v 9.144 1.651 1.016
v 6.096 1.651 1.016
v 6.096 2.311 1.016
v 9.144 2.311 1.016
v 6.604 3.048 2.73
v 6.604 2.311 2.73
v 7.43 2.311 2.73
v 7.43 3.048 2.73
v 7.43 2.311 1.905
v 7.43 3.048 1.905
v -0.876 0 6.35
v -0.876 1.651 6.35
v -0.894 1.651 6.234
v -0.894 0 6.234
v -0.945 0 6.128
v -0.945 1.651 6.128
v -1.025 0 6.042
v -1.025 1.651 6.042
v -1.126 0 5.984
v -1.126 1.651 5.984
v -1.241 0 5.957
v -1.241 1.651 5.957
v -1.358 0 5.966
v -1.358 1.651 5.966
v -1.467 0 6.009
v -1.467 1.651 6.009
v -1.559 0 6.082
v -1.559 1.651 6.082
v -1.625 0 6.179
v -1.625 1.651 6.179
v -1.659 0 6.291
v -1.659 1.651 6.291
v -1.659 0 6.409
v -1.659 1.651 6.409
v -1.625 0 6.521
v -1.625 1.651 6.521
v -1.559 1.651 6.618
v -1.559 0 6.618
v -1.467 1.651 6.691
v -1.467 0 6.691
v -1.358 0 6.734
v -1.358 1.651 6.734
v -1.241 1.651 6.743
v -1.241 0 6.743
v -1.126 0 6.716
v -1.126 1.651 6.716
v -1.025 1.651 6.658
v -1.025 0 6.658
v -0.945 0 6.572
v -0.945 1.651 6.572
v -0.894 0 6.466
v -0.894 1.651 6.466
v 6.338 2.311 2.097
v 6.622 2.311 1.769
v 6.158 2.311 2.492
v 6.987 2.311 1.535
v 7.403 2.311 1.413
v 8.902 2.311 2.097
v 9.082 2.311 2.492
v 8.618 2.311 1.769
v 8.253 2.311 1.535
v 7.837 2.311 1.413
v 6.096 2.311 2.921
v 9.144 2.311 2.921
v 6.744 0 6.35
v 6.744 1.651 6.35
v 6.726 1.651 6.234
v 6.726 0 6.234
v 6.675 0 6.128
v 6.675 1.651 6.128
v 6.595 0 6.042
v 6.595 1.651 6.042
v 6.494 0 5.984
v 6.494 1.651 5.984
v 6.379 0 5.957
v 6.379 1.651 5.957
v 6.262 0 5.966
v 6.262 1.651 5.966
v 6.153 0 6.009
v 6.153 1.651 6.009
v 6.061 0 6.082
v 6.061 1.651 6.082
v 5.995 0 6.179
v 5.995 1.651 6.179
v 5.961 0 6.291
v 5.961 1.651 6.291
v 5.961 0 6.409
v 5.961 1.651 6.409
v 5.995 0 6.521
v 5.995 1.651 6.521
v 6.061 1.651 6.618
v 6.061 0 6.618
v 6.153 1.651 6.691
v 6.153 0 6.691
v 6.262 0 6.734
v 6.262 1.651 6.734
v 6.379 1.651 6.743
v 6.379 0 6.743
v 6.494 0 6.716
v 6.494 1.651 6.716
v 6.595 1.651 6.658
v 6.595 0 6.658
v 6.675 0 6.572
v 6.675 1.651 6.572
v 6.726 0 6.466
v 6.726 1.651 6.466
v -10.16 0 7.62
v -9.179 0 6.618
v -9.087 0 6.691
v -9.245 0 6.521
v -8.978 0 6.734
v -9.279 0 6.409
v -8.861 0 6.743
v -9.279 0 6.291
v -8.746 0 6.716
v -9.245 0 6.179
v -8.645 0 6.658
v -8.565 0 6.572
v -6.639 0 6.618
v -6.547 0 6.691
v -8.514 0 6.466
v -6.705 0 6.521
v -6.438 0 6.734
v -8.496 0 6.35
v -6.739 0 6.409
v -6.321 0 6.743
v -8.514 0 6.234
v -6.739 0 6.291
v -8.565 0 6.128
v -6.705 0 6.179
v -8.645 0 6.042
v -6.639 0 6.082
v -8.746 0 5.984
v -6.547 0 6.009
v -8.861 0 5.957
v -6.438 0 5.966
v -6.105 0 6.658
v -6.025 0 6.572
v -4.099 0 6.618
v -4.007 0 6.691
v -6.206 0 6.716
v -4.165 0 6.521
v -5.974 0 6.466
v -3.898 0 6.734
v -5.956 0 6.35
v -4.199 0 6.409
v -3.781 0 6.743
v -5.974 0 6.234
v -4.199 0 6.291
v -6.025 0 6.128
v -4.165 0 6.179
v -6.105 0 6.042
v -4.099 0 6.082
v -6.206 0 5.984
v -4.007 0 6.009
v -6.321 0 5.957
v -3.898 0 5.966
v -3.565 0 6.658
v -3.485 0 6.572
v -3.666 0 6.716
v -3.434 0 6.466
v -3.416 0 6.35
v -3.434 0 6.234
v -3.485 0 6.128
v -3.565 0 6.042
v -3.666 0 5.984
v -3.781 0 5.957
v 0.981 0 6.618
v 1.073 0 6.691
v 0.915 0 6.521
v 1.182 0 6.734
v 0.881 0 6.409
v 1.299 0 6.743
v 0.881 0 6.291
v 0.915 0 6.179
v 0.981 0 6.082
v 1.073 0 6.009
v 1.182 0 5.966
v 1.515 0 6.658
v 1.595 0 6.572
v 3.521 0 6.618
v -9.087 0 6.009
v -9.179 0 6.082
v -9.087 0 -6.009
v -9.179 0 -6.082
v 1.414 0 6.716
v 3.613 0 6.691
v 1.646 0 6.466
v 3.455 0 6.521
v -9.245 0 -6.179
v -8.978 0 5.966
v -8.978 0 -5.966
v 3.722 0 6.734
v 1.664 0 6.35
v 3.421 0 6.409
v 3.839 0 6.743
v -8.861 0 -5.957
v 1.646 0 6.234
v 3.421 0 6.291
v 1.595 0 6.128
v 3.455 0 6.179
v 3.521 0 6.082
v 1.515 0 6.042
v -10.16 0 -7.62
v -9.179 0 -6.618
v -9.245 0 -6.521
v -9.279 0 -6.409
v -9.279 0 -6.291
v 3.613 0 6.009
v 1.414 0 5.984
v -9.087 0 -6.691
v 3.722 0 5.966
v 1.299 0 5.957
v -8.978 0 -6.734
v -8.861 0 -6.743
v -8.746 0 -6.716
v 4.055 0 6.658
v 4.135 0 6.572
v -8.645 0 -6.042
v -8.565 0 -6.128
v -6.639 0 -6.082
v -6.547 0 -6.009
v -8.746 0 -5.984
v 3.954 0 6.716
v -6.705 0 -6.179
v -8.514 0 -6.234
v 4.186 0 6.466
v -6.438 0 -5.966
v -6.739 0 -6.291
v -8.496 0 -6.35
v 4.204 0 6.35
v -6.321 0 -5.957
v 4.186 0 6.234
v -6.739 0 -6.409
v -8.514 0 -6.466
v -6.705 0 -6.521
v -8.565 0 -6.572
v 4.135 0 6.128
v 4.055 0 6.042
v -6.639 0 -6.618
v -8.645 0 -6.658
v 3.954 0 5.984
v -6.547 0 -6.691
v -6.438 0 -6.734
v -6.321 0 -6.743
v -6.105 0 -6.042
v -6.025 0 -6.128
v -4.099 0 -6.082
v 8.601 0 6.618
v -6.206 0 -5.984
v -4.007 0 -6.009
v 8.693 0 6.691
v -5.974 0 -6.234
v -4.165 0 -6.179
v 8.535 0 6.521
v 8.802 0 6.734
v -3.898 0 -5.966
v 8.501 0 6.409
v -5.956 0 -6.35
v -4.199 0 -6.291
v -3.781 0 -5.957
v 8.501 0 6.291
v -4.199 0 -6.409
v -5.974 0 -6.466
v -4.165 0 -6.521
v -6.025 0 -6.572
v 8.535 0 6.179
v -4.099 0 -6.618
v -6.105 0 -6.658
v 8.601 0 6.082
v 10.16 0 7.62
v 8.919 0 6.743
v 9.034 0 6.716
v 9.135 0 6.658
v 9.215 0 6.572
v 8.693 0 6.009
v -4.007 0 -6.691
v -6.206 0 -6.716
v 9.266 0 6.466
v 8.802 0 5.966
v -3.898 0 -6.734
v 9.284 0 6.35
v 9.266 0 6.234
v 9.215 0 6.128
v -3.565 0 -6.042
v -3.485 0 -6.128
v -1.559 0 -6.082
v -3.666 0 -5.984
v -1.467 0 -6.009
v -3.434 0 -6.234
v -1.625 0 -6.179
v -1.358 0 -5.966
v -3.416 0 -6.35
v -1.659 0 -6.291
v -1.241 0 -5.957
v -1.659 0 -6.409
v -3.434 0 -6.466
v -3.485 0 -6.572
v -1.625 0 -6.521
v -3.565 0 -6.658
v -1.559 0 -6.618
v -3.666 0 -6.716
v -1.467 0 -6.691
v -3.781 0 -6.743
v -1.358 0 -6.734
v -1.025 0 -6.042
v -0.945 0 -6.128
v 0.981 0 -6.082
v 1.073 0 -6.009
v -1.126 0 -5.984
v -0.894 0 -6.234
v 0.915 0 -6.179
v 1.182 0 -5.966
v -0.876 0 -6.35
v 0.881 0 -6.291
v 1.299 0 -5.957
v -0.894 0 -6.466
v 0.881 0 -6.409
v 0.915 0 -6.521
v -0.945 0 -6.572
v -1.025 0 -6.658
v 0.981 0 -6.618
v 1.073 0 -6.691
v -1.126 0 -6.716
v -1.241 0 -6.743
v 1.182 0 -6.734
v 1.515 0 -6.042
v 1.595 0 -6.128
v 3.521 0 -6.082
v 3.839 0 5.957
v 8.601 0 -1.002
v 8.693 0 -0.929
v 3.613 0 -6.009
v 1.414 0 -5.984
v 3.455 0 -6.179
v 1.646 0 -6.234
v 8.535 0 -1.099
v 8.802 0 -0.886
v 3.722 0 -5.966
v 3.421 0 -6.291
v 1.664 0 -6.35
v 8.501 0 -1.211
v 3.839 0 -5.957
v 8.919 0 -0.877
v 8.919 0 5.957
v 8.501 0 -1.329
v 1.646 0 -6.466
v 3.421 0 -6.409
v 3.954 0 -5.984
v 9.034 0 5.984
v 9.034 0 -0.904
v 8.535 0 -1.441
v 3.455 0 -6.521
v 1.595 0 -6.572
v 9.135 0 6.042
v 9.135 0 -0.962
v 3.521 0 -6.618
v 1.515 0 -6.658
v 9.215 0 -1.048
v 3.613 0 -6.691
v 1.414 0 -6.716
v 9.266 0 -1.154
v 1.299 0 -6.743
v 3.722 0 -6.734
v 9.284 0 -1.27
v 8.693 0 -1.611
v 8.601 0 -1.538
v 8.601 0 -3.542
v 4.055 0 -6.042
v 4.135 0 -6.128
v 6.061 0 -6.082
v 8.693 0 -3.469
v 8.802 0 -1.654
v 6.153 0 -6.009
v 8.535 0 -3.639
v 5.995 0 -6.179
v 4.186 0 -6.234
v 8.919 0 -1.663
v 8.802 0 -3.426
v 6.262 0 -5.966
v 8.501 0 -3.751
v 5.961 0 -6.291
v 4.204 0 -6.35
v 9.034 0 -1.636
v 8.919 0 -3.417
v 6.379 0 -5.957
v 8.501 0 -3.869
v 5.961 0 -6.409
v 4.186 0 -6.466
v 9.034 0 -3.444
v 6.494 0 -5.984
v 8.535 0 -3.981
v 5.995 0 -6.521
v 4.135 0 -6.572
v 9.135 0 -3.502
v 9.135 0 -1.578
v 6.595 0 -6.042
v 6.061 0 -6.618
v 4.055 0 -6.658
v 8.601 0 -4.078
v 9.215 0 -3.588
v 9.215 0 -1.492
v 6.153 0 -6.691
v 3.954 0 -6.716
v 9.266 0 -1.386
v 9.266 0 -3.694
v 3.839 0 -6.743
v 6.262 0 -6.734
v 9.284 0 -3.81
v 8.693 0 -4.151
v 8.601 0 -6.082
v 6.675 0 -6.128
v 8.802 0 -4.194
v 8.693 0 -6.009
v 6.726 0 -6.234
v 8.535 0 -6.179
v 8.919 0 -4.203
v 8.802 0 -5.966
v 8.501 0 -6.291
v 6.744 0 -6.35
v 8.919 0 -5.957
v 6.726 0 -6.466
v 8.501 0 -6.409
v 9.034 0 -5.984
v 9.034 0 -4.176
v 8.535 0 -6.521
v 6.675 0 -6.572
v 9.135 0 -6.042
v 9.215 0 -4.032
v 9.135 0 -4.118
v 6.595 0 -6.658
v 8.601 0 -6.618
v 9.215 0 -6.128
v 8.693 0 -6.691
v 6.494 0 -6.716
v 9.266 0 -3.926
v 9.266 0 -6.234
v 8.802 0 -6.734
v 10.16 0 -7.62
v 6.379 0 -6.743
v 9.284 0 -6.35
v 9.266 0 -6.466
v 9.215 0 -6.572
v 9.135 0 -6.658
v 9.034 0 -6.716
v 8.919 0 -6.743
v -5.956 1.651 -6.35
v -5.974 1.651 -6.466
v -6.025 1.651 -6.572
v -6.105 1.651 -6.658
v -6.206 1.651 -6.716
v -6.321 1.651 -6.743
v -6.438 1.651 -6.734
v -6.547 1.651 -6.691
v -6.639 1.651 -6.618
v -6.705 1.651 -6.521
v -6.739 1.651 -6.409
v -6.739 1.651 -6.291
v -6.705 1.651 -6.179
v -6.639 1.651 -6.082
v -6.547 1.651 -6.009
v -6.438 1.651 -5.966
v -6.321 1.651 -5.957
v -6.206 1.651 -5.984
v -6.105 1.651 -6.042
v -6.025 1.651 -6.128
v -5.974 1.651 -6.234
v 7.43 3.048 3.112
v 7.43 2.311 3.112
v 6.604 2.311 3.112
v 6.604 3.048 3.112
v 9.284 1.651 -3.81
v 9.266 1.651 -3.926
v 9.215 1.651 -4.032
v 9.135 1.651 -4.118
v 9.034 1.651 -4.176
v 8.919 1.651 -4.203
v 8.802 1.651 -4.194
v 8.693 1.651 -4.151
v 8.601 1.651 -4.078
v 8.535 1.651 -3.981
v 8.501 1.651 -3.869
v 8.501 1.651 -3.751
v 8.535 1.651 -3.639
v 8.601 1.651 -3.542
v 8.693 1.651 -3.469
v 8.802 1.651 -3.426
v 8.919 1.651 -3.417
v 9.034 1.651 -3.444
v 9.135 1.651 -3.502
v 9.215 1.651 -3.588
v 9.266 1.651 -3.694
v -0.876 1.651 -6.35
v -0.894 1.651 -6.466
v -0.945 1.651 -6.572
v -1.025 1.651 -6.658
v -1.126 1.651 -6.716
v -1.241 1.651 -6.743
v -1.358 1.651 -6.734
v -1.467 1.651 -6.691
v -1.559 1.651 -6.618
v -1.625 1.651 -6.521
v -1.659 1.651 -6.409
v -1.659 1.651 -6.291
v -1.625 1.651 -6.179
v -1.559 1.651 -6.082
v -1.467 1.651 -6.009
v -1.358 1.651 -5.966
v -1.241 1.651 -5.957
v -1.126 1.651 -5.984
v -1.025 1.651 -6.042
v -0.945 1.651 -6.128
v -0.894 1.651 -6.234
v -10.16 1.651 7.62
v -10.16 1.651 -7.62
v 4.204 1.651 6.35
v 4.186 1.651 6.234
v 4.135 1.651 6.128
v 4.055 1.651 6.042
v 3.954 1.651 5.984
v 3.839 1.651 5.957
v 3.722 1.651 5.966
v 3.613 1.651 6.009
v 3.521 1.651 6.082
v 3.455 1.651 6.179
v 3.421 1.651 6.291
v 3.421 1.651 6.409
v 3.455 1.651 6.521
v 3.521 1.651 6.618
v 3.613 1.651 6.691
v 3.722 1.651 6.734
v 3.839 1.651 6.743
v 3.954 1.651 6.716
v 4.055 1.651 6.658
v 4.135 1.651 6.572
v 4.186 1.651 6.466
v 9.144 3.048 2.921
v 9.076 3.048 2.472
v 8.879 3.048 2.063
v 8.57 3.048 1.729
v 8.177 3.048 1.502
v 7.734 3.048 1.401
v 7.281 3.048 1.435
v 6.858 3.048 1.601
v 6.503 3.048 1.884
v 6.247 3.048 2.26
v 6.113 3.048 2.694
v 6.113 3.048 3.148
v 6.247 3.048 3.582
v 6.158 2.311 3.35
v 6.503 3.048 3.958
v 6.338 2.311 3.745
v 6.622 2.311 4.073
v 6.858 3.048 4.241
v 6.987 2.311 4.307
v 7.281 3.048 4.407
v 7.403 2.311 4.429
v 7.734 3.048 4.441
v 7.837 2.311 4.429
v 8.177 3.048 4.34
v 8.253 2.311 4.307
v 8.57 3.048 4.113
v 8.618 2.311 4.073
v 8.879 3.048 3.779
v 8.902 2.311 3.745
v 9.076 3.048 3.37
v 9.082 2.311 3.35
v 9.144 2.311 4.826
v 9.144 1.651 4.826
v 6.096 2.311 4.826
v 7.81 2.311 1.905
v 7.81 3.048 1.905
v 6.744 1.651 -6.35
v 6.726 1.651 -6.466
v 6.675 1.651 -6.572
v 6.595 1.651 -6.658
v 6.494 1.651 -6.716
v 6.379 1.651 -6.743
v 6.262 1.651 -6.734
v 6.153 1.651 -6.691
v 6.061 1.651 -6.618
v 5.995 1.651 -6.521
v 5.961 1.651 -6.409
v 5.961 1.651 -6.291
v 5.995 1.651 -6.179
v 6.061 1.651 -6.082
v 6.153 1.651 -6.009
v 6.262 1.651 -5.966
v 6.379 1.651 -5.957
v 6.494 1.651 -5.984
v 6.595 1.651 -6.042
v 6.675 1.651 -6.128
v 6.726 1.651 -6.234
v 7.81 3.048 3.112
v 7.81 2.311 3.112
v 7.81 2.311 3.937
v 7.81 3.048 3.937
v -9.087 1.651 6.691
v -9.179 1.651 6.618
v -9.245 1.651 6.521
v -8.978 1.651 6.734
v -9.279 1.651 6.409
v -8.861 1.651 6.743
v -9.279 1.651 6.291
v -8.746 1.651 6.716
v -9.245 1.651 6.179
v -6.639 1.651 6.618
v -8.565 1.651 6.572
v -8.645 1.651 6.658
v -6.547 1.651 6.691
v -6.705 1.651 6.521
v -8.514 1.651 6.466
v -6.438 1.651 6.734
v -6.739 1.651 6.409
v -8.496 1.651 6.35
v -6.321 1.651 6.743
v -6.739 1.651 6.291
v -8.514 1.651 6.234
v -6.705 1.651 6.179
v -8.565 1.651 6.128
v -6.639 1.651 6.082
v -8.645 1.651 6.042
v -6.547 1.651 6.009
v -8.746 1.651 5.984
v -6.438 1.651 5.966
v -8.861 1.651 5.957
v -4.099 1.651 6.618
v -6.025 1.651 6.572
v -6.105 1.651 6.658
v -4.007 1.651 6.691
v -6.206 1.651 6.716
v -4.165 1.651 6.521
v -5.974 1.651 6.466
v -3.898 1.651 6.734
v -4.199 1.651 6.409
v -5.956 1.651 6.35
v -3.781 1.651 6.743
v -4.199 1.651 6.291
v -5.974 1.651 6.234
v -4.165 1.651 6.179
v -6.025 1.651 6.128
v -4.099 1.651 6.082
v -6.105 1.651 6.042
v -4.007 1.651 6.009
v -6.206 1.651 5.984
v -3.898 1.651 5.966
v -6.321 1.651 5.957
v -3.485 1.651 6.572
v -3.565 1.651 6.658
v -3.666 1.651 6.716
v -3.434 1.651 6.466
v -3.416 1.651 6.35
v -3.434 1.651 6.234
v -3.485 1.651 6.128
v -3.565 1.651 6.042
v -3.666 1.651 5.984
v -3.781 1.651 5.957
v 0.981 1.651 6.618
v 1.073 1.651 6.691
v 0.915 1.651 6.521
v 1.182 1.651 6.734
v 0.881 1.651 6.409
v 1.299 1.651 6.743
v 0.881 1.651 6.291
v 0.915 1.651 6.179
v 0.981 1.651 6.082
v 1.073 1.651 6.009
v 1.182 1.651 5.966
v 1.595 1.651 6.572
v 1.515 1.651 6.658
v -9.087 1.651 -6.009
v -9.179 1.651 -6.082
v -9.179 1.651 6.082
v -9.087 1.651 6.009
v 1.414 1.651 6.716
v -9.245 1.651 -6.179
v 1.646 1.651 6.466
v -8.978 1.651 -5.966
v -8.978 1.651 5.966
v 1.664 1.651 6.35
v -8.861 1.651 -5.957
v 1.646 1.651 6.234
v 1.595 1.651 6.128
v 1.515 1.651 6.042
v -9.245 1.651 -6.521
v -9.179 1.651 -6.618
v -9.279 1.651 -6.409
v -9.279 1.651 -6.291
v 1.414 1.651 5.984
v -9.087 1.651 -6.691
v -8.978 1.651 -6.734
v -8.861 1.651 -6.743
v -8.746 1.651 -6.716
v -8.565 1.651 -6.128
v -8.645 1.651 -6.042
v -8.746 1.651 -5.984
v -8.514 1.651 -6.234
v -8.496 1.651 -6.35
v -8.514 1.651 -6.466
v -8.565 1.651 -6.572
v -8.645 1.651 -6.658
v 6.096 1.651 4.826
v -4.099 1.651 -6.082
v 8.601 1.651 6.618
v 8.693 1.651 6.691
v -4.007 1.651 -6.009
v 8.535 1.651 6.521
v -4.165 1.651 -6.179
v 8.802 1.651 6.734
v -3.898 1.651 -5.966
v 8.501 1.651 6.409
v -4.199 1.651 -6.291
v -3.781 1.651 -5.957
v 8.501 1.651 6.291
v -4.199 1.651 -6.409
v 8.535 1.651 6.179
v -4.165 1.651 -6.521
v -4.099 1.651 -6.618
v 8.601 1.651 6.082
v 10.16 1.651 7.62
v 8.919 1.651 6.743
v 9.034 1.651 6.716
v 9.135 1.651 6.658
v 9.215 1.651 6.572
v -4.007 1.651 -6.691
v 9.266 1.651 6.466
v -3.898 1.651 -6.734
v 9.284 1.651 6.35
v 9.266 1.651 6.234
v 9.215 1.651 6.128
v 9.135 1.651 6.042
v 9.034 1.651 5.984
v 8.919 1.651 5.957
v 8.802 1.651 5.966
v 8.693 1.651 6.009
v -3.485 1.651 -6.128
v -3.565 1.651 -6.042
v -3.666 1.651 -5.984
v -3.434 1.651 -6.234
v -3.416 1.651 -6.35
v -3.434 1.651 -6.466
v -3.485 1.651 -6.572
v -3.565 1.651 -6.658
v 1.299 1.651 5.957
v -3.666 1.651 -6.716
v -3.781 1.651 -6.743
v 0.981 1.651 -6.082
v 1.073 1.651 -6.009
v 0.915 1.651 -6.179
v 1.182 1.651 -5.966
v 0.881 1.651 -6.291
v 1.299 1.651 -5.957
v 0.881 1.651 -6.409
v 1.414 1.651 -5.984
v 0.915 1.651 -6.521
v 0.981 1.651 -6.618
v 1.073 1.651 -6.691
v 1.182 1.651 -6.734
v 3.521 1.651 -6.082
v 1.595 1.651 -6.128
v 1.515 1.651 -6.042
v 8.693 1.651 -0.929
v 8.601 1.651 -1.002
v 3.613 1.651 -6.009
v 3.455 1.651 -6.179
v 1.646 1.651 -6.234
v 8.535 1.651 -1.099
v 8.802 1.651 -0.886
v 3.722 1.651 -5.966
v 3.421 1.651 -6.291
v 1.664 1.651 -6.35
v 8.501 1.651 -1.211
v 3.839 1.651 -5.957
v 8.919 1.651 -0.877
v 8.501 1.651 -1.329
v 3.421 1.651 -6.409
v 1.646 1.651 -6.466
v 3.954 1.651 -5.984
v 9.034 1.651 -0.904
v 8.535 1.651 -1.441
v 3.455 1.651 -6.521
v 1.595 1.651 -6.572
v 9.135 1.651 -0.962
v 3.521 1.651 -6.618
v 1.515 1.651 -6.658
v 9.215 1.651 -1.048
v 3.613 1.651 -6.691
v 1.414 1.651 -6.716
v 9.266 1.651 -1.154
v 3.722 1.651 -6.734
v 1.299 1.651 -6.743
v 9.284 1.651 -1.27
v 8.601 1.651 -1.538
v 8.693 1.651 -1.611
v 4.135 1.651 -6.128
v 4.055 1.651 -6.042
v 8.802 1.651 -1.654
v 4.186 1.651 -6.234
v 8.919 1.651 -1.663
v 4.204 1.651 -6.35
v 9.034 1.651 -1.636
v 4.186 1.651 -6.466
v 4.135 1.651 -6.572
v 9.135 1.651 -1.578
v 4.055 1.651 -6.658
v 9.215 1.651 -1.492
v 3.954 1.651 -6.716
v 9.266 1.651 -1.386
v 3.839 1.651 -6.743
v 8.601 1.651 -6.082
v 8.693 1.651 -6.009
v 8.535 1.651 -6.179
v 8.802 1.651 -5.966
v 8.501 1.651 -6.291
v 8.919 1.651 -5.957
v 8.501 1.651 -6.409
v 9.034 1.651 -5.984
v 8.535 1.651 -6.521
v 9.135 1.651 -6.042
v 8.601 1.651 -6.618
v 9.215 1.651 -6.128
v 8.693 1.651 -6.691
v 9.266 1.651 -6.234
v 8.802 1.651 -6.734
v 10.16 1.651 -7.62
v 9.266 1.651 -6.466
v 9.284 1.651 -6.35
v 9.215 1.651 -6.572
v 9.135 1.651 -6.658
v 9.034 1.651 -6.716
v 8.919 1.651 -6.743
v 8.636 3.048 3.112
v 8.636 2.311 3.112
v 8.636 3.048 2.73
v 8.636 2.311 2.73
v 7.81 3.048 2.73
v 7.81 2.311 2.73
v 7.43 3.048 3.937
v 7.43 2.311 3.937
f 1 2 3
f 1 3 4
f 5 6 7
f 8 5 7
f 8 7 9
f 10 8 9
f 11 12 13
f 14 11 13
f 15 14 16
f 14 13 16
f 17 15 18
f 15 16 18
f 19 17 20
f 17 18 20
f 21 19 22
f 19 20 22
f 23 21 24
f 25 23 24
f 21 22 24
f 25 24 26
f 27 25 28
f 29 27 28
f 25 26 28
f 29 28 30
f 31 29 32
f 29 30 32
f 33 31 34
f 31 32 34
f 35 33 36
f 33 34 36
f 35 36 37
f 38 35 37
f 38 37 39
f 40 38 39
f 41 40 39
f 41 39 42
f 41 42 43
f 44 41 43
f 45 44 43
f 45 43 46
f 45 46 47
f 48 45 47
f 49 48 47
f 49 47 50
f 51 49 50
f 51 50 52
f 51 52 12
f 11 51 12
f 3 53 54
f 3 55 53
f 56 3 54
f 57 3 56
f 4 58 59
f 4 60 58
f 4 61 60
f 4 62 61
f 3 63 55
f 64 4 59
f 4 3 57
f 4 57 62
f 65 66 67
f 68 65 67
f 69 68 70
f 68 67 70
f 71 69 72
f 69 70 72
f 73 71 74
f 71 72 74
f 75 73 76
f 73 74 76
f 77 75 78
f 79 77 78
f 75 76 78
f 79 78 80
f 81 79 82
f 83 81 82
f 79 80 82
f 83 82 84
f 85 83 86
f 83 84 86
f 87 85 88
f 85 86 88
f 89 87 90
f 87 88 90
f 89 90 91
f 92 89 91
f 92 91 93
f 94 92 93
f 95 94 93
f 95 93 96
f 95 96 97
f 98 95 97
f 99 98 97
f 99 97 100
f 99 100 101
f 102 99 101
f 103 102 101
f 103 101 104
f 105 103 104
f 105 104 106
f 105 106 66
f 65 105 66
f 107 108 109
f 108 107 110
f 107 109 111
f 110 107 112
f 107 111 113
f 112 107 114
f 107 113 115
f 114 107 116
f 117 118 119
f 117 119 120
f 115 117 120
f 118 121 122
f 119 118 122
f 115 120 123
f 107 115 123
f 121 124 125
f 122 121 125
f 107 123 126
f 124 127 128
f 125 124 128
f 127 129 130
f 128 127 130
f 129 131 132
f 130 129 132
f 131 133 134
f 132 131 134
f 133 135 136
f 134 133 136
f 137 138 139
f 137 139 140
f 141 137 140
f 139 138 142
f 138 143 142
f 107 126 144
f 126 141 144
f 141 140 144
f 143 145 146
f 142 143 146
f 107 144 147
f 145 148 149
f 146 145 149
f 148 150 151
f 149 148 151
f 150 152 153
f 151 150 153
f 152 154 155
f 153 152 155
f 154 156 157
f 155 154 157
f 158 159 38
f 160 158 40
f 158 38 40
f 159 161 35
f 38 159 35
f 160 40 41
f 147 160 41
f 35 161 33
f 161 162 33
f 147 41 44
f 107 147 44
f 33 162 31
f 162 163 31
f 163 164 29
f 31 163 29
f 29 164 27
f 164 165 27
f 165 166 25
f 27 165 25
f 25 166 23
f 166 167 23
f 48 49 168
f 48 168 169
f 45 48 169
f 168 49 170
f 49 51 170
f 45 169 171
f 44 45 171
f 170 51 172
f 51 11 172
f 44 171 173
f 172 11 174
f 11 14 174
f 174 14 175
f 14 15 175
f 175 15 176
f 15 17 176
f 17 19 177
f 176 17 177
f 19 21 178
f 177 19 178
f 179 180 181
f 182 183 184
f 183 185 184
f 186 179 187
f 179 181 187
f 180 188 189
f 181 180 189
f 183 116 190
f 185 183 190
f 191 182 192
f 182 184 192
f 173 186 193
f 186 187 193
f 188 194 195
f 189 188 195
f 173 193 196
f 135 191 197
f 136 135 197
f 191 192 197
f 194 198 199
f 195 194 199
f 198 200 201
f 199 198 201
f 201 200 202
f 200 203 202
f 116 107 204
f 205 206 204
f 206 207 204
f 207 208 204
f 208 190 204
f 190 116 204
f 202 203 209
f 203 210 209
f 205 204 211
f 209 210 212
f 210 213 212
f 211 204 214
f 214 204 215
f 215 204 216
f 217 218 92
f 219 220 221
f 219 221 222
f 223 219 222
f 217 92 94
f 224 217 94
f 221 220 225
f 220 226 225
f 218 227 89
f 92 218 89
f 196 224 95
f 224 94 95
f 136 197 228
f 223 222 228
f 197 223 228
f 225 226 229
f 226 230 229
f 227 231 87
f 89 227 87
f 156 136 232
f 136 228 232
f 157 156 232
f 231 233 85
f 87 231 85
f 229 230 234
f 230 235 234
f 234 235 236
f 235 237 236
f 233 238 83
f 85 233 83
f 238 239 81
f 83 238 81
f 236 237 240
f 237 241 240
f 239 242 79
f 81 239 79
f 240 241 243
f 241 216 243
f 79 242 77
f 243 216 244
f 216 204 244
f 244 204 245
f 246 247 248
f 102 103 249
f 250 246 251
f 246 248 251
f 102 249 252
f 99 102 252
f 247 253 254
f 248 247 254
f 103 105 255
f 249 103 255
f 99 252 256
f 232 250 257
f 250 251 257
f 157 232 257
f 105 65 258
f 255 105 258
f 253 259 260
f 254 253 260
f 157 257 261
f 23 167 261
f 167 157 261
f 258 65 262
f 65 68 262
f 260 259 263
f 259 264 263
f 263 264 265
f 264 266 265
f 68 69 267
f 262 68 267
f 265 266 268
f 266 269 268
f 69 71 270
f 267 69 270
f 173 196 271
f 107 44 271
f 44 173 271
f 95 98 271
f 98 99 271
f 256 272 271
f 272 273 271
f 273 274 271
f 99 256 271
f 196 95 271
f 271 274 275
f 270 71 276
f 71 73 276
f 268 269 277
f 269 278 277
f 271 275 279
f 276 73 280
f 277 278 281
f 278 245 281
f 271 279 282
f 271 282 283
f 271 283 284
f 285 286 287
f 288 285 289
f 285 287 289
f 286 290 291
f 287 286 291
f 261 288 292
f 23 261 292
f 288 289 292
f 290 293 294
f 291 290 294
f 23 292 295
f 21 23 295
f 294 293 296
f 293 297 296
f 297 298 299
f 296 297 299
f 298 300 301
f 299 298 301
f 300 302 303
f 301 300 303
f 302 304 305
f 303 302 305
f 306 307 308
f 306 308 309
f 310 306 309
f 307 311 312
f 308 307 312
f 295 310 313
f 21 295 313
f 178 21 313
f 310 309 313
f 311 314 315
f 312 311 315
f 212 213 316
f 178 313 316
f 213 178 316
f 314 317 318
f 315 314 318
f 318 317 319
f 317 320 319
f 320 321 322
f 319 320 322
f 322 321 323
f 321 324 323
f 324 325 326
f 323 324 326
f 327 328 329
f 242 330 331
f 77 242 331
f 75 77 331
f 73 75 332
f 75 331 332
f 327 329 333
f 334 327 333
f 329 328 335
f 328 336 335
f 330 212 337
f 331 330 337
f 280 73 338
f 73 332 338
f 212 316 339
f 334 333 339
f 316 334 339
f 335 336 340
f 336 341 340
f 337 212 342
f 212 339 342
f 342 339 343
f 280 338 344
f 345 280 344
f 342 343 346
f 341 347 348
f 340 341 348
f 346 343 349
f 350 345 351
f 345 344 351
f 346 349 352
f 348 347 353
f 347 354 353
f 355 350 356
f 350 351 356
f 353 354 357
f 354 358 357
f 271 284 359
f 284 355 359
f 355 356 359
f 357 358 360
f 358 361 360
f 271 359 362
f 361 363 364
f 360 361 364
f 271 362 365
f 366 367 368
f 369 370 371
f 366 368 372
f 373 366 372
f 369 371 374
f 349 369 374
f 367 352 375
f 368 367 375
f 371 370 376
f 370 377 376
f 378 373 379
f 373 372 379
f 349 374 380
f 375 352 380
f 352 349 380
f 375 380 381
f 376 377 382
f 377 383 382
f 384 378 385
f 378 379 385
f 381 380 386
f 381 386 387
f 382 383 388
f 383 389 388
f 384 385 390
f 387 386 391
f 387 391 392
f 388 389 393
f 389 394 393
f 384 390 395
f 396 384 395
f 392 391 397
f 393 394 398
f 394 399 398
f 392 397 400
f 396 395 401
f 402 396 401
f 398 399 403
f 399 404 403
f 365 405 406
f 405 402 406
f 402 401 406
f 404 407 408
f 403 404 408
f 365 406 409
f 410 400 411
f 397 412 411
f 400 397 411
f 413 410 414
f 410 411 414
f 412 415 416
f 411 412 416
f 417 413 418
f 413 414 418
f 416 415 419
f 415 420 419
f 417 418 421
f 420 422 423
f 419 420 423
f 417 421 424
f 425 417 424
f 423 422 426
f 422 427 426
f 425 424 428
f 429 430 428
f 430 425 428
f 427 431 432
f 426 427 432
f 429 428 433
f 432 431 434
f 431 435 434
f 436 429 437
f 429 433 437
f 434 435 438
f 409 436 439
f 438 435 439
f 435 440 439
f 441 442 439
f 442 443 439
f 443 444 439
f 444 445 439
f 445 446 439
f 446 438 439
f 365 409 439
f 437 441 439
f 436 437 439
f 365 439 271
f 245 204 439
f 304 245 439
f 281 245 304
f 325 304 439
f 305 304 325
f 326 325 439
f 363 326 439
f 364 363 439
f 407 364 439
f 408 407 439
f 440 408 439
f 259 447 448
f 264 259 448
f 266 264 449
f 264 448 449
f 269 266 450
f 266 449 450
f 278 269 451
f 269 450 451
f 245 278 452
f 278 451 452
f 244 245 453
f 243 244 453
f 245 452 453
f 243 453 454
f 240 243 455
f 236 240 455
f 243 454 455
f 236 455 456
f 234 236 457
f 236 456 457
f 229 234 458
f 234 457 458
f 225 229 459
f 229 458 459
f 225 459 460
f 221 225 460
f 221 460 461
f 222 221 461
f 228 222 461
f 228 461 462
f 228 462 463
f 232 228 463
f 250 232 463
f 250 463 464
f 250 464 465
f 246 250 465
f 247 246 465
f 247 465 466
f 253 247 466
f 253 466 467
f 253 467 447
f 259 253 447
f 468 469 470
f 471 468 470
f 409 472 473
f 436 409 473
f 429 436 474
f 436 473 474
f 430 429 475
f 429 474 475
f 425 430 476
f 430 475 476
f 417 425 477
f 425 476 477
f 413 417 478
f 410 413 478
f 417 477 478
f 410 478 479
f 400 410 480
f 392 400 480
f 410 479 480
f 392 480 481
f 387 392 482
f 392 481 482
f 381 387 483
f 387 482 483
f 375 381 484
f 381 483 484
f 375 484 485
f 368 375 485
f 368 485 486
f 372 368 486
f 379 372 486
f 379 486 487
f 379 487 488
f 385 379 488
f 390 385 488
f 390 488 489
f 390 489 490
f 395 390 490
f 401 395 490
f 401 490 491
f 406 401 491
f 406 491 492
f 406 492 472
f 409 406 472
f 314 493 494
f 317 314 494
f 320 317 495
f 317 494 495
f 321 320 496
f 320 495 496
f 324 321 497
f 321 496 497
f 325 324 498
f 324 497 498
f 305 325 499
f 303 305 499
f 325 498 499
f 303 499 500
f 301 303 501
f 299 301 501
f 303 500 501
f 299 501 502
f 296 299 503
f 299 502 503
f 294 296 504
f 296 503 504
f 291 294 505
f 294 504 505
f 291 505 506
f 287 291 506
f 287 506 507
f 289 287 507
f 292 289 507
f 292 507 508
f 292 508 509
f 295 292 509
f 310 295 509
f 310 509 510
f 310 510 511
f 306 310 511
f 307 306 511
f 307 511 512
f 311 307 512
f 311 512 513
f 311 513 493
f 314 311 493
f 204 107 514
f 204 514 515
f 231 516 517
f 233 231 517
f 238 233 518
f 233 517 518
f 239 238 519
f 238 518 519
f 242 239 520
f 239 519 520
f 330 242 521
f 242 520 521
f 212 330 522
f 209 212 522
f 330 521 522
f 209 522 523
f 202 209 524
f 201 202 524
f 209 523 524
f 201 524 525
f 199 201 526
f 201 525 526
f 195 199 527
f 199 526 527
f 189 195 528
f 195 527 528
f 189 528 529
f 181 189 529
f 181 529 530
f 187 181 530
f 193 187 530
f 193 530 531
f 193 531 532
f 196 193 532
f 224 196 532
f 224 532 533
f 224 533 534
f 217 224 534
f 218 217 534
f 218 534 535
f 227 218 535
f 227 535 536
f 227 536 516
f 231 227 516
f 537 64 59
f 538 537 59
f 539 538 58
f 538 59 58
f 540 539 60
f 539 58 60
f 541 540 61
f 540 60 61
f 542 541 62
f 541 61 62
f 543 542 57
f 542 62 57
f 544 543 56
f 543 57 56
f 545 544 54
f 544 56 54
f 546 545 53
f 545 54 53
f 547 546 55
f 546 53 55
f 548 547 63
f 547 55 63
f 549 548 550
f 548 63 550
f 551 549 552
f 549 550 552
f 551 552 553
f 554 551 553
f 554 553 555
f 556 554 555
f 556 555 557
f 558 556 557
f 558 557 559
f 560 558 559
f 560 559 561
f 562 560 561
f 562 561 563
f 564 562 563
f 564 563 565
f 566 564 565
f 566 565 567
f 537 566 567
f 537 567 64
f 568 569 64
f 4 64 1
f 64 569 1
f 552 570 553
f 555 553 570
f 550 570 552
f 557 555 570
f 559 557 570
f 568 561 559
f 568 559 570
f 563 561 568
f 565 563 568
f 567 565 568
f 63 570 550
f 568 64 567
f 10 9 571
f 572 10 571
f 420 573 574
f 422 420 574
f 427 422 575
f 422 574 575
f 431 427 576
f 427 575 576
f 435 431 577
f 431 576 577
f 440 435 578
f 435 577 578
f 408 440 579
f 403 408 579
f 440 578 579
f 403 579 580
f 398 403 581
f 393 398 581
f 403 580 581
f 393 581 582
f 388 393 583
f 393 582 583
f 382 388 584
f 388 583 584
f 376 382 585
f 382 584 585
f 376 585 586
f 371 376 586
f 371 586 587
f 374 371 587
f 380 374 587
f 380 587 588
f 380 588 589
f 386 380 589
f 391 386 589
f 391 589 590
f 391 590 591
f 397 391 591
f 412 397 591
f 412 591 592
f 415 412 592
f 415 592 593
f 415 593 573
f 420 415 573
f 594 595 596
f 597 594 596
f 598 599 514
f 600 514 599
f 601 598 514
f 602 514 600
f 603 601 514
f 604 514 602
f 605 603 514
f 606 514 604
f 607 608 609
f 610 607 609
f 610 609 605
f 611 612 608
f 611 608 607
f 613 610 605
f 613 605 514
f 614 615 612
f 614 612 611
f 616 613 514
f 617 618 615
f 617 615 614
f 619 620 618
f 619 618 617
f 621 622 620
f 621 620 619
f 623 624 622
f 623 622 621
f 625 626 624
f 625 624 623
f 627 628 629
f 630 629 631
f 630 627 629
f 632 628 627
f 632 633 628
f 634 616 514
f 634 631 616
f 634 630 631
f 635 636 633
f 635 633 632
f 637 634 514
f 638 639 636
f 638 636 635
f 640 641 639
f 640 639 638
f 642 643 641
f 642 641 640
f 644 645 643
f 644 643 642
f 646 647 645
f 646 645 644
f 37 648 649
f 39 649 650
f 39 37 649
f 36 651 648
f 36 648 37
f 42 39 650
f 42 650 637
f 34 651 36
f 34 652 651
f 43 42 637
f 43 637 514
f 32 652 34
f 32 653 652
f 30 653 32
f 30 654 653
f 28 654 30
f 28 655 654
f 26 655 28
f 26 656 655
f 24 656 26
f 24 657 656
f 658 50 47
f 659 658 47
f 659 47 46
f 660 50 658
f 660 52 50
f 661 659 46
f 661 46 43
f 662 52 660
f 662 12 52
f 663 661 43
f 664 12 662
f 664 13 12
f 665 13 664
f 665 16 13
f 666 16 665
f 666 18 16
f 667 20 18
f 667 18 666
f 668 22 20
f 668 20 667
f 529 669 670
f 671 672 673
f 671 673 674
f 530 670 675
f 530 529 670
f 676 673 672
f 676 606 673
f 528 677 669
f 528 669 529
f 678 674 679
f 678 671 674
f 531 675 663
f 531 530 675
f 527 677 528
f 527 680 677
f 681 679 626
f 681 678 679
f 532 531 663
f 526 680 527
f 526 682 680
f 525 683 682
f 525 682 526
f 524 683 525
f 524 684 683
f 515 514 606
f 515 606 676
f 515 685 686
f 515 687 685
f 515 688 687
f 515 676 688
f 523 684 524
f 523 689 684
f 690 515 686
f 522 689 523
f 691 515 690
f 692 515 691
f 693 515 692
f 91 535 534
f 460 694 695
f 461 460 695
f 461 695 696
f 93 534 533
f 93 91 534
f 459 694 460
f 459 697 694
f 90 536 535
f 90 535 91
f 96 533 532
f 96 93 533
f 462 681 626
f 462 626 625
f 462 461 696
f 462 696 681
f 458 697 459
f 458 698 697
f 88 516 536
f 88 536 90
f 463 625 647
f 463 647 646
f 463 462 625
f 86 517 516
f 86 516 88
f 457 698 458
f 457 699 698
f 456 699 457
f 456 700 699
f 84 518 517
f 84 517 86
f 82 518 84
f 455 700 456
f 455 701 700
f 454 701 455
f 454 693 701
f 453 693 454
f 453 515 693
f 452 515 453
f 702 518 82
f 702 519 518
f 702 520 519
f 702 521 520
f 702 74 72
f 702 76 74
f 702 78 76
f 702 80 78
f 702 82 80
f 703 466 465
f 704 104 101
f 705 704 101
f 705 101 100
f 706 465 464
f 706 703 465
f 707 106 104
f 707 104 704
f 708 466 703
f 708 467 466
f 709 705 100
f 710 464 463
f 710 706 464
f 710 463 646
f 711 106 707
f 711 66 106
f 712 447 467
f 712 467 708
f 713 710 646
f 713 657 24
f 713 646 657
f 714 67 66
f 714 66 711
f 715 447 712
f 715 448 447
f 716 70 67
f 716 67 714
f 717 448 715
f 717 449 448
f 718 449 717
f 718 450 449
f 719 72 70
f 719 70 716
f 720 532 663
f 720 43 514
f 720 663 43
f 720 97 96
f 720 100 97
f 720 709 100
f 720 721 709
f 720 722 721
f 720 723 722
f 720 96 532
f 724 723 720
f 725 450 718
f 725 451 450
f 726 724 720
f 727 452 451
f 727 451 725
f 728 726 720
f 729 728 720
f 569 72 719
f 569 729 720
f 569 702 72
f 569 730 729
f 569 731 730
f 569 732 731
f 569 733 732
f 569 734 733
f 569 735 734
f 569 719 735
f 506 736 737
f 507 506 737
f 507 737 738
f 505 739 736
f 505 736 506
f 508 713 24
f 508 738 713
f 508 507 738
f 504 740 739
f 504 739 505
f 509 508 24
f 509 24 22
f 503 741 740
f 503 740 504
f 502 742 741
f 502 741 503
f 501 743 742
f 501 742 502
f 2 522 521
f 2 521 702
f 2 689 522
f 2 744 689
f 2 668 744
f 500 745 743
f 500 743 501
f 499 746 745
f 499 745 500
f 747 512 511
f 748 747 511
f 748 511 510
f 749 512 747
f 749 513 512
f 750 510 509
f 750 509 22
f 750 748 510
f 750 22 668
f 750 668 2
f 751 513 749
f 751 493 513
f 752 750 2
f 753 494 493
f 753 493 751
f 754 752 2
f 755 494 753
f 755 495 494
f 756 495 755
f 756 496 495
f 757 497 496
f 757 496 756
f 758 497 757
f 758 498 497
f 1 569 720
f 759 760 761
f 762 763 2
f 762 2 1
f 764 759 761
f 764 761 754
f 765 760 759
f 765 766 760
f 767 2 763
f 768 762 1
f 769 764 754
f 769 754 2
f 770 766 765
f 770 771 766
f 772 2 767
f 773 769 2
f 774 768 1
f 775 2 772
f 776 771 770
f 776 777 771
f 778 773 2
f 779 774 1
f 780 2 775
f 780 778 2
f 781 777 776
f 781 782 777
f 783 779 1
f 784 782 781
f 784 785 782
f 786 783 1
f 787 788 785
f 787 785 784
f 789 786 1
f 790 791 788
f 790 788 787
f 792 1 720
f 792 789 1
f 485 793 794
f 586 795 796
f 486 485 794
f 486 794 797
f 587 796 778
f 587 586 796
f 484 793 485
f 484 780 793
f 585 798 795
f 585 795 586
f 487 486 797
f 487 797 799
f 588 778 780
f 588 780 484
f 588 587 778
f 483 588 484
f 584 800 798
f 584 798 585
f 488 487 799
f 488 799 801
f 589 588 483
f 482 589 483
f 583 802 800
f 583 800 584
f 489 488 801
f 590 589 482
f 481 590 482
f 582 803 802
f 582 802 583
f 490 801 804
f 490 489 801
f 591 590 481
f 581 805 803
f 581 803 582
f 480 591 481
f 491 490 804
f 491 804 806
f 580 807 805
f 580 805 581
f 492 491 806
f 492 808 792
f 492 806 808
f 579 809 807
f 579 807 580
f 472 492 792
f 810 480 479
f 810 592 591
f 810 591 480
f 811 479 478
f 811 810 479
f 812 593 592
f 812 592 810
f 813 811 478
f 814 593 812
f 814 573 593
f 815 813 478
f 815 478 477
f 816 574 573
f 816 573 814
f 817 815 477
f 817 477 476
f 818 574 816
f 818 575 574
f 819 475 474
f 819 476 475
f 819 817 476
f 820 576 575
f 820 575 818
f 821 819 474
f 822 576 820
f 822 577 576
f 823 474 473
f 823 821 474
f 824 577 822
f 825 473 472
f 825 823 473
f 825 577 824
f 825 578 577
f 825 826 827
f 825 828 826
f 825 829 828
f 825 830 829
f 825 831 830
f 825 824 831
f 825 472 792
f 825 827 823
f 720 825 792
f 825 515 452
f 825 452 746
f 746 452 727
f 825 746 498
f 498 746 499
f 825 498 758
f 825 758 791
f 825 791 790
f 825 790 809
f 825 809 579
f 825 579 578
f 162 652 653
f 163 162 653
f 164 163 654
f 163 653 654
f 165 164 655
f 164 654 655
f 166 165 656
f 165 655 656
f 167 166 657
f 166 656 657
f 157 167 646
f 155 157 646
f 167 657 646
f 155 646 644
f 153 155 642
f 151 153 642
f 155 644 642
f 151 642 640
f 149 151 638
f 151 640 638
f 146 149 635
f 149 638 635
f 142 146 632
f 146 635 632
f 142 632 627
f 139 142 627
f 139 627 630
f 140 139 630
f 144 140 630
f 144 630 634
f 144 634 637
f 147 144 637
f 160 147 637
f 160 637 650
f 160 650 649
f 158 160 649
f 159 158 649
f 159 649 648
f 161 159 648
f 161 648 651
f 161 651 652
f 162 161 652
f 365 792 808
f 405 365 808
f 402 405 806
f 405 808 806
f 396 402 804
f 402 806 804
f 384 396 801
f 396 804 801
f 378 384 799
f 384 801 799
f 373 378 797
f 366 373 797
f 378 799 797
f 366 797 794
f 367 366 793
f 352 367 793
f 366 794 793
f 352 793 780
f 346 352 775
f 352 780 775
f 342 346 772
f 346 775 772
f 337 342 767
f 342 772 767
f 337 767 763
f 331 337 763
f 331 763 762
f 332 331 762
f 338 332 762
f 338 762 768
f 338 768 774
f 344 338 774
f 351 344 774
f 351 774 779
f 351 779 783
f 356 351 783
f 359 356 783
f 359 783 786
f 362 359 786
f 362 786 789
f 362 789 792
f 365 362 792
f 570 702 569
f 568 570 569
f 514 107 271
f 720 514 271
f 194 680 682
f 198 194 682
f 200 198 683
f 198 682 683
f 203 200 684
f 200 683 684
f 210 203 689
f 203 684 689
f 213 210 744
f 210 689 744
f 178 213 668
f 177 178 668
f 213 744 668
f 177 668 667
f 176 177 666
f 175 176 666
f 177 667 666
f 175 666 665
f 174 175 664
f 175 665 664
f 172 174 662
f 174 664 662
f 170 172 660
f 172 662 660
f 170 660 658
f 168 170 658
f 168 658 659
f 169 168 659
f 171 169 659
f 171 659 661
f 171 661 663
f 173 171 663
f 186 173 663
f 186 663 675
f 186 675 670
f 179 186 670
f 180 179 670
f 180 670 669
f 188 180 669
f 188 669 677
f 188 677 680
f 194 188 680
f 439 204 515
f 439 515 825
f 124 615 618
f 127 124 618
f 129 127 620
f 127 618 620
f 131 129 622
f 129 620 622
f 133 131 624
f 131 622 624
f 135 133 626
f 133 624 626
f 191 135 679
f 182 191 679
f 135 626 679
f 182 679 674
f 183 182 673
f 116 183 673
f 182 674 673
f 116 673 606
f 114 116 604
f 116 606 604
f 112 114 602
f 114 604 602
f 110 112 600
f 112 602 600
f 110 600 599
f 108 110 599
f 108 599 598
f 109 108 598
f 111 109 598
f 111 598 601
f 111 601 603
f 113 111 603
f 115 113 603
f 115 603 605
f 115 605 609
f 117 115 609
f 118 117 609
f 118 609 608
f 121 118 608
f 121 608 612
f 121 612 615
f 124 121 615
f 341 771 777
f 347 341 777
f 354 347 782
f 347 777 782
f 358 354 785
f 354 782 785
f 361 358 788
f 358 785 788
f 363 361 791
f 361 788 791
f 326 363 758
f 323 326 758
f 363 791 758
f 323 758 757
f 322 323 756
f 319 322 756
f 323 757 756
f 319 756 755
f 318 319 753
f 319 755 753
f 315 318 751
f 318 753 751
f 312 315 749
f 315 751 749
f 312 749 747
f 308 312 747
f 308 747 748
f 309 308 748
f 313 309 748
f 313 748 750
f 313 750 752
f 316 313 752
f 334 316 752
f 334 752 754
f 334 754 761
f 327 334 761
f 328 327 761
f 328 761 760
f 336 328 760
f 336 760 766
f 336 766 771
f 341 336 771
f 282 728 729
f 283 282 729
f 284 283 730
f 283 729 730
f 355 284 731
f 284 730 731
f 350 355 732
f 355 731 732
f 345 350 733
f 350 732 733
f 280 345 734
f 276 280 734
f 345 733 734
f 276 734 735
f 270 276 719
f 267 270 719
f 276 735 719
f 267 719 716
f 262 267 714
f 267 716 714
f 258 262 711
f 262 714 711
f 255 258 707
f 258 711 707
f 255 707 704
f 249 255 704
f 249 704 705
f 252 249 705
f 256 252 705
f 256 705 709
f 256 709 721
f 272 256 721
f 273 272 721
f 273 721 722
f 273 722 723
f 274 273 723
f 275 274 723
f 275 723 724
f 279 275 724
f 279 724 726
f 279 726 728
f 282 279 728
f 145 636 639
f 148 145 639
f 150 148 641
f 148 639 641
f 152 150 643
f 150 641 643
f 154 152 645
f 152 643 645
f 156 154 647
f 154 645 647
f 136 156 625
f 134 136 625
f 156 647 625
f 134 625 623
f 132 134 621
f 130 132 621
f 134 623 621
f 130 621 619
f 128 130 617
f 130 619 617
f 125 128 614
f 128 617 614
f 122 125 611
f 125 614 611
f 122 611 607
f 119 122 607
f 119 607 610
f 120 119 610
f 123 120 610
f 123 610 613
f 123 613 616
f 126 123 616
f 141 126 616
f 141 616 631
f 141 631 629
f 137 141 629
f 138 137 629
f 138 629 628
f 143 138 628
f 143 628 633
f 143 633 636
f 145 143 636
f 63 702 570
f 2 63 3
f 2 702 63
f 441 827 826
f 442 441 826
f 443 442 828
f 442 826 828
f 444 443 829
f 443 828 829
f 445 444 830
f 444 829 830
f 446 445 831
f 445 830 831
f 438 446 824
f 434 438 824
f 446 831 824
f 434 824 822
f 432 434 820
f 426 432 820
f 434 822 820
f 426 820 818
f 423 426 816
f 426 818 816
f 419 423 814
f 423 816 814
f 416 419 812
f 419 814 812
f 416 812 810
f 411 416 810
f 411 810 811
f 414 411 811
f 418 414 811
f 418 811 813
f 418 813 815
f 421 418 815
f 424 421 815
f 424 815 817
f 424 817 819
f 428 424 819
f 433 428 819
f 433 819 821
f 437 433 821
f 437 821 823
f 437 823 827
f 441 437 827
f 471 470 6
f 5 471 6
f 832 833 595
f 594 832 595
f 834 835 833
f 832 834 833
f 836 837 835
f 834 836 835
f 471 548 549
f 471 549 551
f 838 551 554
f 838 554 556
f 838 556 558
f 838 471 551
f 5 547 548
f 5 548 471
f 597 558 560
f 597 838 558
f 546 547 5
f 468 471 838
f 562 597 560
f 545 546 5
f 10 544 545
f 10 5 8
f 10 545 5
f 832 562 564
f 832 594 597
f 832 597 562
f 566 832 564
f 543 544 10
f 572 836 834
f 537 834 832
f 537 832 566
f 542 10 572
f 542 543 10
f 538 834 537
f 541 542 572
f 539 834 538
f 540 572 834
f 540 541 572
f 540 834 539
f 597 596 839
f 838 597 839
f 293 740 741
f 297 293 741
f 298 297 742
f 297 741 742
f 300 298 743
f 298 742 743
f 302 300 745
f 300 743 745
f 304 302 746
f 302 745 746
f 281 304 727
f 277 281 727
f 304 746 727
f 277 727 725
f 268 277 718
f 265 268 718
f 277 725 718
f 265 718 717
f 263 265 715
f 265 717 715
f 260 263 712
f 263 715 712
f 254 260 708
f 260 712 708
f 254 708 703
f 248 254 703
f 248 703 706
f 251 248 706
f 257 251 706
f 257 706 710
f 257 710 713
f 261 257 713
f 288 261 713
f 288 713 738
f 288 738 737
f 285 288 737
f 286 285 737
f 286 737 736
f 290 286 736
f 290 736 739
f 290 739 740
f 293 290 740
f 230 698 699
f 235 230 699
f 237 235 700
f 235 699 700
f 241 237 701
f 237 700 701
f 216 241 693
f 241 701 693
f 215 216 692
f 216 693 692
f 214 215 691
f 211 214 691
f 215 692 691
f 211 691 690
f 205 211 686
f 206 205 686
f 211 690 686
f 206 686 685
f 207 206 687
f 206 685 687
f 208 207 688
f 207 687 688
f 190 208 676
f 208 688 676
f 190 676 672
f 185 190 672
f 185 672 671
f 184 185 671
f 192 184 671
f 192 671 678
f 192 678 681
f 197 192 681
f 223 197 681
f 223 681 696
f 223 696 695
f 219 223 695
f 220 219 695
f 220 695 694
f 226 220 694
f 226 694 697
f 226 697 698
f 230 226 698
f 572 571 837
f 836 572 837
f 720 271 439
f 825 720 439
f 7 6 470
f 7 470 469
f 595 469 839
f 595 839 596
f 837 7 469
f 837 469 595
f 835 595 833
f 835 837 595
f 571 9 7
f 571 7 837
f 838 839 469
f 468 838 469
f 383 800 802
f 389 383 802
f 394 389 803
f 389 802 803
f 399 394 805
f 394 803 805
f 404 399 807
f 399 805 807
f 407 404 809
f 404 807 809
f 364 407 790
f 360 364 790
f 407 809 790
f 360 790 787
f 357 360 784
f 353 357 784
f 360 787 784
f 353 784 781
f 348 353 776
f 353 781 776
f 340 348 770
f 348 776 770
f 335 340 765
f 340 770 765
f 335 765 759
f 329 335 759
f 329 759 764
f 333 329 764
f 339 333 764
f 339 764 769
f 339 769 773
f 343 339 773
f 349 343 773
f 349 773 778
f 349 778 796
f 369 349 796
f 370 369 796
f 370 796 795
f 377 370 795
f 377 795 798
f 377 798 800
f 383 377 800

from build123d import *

# Parameters (mm, degrees)
SKETCH1_W            = 20.32
SKETCH1_H            = 15.24
BOSS_EXTRUDE1_DEPTH  = 1.651
SKETCH3_W            = 3.048
SKETCH3_H            = 3.81
BOSS_EXTRUDE3_DEPTH  = 0.6604
SKETCH4_R            = 1.524
BOSS_EXTRUDE4_DEPTH  = 0.7366
SKETCH7_R            = 0.3937
CUT_EXTRUDE2_DEPTH   = 2.651
LPATTERN2_COUNT      = 8
LPATTERN2_PITCH      = 2.54
LPATTERN2_COUNT_DIR2 = 2
LPATTERN2_PITCH_DIR2 = 12.7
CUT_EXTRUDE3_REACH   = 3.651
SKETCH8_R            = 0.3937


with BuildPart() as part:
    # Sketch1 → Boss-Extrude1 (new body)
    with BuildSketch(Plane(origin=(0, 0, 0), x_dir=(1, 0, 0), z_dir=(0, 1, 0))):
        Rectangle(SKETCH1_W, SKETCH1_H)
    extrude(amount=BOSS_EXTRUDE1_DEPTH)

    # Sketch3 → Boss-Extrude3 (add)
    with BuildSketch(Plane(origin=(0, 1.651, 0), x_dir=(1, 0, 0), z_dir=(0, 1, 0))):
        with Locations((7.62, -2.921)):
            Rectangle(SKETCH3_W, SKETCH3_H)
    extrude(amount=BOSS_EXTRUDE3_DEPTH)

    # Sketch4 → Boss-Extrude4 (add)
    with BuildSketch(Plane(origin=(0, 2.3114, 0), x_dir=(1, 0, 0), z_dir=(0, 1, 0))):
        with Locations((7.62, -2.921)):
            Circle(SKETCH4_R)
        Polygon((7.8105, -2.7305), (8.636, -2.7305), (8.636, -3.1115), (7.8105, -3.1115), (7.8105, -3.937), (7.4295, -3.937), (7.4295, -3.1115), (6.604, -3.1115), (6.604, -2.7305), (7.4295, -2.7305), (7.4295, -1.905), (7.8105, -1.905), align=None, mode=Mode.SUBTRACT)
    extrude(amount=BOSS_EXTRUDE4_DEPTH)

    # Sketch7 → Cut-Extrude2 (cut, through all)
    with BuildSketch(Plane(origin=(0, 1.651, 0), x_dir=(1, 0, 0), z_dir=(0, 1, 0))):
        with Locations((-8.89, -6.35)):
            Circle(SKETCH7_R)
    cut_extrude2 = extrude(amount=-CUT_EXTRUDE2_DEPTH, mode=Mode.SUBTRACT)

    # LPattern2: Cut-Extrude2 8 × 2
    with Locations(*[(i * LPATTERN2_PITCH, 0, -j * LPATTERN2_PITCH_DIR2) for i in range(LPATTERN2_COUNT) for j in range(LPATTERN2_COUNT_DIR2) if (i, j) != (0, 0)]):
        add(cut_extrude2, mode=Mode.SUBTRACT)

    # Sketch8 → Cut-Extrude3 (cut, up to next)
    with BuildSketch(Plane(origin=(0, 1.651, 0), x_dir=(1, 0, 0), z_dir=(0, 1, 0)), mode=Mode.PRIVATE) as cut_extrude3_sk1:
        with Locations((8.89, 3.81)):
            Circle(SKETCH8_R)
    cut_extrude3_tool1 = extrude(cut_extrude3_sk1.sketch, amount=-CUT_EXTRUDE3_REACH, mode=Mode.PRIVATE) & part.part
    add(cut_extrude3_tool1.solids().sort_by_distance((8.89, 1.651, -3.81))[0], mode=Mode.SUBTRACT)
    # Sketch8 → Cut-Extrude3 (cut, up to next)
    with BuildSketch(Plane(origin=(0, 1.651, 0), x_dir=(1, 0, 0), z_dir=(0, 1, 0)), mode=Mode.PRIVATE) as cut_extrude3_sk2:
        with Locations((8.89, 1.27)):
            Circle(SKETCH8_R)
    cut_extrude3_tool2 = extrude(cut_extrude3_sk2.sketch, amount=-CUT_EXTRUDE3_REACH, mode=Mode.PRIVATE) & part.part
    add(cut_extrude3_tool2.solids().sort_by_distance((8.89, 1.651, -1.27))[0], mode=Mode.SUBTRACT)


solid = part.part
